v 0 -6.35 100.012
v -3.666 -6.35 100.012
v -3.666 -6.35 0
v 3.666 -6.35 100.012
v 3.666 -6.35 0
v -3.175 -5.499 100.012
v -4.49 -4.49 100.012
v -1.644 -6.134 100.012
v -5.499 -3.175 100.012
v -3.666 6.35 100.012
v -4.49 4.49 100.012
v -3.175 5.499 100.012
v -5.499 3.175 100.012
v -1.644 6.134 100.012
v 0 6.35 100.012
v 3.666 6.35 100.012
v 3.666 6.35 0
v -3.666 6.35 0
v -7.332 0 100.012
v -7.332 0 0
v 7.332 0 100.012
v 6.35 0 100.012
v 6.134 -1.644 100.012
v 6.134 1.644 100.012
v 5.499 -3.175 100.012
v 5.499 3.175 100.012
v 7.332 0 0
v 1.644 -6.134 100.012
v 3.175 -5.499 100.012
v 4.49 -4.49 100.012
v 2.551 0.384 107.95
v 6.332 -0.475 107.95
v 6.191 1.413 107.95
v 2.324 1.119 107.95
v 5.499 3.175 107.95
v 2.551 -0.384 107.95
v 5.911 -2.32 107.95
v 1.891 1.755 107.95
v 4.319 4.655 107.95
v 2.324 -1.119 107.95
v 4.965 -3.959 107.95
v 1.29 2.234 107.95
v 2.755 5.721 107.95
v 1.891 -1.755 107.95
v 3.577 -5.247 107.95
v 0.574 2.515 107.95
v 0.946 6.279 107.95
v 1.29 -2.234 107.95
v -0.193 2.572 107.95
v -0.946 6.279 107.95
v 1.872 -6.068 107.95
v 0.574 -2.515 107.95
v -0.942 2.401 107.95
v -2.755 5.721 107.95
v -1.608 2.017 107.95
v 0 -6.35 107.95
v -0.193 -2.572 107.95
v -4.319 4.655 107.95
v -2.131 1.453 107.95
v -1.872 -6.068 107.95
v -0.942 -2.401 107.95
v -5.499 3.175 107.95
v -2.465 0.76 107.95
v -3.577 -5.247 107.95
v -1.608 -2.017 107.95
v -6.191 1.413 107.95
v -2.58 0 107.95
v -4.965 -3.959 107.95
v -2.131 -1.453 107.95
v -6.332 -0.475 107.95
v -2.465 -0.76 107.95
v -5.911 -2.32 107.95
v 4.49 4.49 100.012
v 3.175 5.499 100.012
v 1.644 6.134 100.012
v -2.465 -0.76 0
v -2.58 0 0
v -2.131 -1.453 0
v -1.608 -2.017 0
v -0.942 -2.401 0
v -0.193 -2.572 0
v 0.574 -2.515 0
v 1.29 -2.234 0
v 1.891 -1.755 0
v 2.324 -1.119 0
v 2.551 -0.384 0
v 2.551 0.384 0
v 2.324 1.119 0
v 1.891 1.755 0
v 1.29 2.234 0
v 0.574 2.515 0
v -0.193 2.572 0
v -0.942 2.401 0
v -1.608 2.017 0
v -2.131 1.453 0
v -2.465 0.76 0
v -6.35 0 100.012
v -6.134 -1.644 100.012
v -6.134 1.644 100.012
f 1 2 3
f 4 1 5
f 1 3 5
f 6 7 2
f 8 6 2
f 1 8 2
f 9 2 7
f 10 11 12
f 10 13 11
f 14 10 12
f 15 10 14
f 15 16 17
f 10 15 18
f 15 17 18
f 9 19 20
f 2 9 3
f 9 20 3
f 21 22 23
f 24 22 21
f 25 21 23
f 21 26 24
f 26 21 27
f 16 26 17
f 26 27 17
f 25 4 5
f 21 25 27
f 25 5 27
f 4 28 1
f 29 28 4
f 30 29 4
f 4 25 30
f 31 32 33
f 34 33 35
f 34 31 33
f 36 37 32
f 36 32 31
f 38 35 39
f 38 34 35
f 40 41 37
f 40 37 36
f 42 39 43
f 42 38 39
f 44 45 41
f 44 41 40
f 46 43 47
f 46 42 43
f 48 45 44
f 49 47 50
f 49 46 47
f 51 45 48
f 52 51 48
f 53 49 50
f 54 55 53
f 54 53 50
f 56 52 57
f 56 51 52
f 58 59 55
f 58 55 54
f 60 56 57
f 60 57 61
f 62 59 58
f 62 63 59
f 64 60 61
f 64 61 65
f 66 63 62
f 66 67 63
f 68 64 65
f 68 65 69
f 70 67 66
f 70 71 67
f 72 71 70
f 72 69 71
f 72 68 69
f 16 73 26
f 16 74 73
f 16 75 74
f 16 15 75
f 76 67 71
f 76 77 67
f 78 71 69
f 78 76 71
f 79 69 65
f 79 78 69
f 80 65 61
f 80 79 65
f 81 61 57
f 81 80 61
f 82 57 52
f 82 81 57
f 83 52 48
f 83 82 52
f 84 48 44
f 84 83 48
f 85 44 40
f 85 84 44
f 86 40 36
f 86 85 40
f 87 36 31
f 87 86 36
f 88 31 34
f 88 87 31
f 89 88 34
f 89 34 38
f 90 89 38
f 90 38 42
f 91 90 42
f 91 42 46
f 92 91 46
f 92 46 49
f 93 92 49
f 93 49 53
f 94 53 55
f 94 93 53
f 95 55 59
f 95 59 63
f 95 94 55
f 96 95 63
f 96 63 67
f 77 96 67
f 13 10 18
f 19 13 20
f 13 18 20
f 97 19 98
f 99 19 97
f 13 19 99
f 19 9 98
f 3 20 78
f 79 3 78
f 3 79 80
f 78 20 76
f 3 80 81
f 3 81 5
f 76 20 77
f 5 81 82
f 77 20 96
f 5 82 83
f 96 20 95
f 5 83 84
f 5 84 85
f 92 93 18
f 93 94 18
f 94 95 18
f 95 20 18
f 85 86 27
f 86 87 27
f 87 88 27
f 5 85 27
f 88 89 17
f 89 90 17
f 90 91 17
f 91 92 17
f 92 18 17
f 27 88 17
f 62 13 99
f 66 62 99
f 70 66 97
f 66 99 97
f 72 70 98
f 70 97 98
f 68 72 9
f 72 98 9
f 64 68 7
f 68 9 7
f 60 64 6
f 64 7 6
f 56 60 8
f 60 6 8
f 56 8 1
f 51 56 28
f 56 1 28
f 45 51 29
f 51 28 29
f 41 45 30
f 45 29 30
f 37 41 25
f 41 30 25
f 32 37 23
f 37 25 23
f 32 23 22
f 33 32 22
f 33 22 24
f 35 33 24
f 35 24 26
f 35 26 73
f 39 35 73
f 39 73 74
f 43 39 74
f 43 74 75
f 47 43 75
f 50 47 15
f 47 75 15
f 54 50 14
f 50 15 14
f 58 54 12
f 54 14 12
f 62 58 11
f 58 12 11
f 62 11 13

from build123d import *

# Parameters (mm, degrees)
SKETCH1_R           = 2.5796875
BOSS_EXTRUDE1_DEPTH = 100.0125
SKETCH2_R           = 6.35
SKETCH2_R_2         = 2.5796875
BOSS_EXTRUDE2_DEPTH = 7.9375


with BuildPart() as part:
    # Sketch1 → Boss-Extrude1 (new body)
    with BuildSketch(Plane.XY):
        Polygon((7.332348419, 0), (3.666174209, 6.35), (-3.666174209, 6.35), (-7.332348419, 0), (-3.666174209, -6.35), (3.666174209, -6.35), align=None)
        with Locations(Location((0, 0, 0), (0, 0, 180))):
            Circle(SKETCH1_R, mode=Mode.SUBTRACT)
    extrude(amount=BOSS_EXTRUDE1_DEPTH)

    # Sketch2 → Boss-Extrude2 (add)
    with BuildSketch(Plane.XY.offset(100.0125)):
        with Locations(Location((0, 0, 0), (0, 0, 150))):
            Circle(SKETCH2_R)
        with Locations(Location((0, 0, 0), (0, 0, 180))):
            Circle(SKETCH2_R_2, mode=Mode.SUBTRACT)
    extrude(amount=BOSS_EXTRUDE2_DEPTH)


solid = part.part
